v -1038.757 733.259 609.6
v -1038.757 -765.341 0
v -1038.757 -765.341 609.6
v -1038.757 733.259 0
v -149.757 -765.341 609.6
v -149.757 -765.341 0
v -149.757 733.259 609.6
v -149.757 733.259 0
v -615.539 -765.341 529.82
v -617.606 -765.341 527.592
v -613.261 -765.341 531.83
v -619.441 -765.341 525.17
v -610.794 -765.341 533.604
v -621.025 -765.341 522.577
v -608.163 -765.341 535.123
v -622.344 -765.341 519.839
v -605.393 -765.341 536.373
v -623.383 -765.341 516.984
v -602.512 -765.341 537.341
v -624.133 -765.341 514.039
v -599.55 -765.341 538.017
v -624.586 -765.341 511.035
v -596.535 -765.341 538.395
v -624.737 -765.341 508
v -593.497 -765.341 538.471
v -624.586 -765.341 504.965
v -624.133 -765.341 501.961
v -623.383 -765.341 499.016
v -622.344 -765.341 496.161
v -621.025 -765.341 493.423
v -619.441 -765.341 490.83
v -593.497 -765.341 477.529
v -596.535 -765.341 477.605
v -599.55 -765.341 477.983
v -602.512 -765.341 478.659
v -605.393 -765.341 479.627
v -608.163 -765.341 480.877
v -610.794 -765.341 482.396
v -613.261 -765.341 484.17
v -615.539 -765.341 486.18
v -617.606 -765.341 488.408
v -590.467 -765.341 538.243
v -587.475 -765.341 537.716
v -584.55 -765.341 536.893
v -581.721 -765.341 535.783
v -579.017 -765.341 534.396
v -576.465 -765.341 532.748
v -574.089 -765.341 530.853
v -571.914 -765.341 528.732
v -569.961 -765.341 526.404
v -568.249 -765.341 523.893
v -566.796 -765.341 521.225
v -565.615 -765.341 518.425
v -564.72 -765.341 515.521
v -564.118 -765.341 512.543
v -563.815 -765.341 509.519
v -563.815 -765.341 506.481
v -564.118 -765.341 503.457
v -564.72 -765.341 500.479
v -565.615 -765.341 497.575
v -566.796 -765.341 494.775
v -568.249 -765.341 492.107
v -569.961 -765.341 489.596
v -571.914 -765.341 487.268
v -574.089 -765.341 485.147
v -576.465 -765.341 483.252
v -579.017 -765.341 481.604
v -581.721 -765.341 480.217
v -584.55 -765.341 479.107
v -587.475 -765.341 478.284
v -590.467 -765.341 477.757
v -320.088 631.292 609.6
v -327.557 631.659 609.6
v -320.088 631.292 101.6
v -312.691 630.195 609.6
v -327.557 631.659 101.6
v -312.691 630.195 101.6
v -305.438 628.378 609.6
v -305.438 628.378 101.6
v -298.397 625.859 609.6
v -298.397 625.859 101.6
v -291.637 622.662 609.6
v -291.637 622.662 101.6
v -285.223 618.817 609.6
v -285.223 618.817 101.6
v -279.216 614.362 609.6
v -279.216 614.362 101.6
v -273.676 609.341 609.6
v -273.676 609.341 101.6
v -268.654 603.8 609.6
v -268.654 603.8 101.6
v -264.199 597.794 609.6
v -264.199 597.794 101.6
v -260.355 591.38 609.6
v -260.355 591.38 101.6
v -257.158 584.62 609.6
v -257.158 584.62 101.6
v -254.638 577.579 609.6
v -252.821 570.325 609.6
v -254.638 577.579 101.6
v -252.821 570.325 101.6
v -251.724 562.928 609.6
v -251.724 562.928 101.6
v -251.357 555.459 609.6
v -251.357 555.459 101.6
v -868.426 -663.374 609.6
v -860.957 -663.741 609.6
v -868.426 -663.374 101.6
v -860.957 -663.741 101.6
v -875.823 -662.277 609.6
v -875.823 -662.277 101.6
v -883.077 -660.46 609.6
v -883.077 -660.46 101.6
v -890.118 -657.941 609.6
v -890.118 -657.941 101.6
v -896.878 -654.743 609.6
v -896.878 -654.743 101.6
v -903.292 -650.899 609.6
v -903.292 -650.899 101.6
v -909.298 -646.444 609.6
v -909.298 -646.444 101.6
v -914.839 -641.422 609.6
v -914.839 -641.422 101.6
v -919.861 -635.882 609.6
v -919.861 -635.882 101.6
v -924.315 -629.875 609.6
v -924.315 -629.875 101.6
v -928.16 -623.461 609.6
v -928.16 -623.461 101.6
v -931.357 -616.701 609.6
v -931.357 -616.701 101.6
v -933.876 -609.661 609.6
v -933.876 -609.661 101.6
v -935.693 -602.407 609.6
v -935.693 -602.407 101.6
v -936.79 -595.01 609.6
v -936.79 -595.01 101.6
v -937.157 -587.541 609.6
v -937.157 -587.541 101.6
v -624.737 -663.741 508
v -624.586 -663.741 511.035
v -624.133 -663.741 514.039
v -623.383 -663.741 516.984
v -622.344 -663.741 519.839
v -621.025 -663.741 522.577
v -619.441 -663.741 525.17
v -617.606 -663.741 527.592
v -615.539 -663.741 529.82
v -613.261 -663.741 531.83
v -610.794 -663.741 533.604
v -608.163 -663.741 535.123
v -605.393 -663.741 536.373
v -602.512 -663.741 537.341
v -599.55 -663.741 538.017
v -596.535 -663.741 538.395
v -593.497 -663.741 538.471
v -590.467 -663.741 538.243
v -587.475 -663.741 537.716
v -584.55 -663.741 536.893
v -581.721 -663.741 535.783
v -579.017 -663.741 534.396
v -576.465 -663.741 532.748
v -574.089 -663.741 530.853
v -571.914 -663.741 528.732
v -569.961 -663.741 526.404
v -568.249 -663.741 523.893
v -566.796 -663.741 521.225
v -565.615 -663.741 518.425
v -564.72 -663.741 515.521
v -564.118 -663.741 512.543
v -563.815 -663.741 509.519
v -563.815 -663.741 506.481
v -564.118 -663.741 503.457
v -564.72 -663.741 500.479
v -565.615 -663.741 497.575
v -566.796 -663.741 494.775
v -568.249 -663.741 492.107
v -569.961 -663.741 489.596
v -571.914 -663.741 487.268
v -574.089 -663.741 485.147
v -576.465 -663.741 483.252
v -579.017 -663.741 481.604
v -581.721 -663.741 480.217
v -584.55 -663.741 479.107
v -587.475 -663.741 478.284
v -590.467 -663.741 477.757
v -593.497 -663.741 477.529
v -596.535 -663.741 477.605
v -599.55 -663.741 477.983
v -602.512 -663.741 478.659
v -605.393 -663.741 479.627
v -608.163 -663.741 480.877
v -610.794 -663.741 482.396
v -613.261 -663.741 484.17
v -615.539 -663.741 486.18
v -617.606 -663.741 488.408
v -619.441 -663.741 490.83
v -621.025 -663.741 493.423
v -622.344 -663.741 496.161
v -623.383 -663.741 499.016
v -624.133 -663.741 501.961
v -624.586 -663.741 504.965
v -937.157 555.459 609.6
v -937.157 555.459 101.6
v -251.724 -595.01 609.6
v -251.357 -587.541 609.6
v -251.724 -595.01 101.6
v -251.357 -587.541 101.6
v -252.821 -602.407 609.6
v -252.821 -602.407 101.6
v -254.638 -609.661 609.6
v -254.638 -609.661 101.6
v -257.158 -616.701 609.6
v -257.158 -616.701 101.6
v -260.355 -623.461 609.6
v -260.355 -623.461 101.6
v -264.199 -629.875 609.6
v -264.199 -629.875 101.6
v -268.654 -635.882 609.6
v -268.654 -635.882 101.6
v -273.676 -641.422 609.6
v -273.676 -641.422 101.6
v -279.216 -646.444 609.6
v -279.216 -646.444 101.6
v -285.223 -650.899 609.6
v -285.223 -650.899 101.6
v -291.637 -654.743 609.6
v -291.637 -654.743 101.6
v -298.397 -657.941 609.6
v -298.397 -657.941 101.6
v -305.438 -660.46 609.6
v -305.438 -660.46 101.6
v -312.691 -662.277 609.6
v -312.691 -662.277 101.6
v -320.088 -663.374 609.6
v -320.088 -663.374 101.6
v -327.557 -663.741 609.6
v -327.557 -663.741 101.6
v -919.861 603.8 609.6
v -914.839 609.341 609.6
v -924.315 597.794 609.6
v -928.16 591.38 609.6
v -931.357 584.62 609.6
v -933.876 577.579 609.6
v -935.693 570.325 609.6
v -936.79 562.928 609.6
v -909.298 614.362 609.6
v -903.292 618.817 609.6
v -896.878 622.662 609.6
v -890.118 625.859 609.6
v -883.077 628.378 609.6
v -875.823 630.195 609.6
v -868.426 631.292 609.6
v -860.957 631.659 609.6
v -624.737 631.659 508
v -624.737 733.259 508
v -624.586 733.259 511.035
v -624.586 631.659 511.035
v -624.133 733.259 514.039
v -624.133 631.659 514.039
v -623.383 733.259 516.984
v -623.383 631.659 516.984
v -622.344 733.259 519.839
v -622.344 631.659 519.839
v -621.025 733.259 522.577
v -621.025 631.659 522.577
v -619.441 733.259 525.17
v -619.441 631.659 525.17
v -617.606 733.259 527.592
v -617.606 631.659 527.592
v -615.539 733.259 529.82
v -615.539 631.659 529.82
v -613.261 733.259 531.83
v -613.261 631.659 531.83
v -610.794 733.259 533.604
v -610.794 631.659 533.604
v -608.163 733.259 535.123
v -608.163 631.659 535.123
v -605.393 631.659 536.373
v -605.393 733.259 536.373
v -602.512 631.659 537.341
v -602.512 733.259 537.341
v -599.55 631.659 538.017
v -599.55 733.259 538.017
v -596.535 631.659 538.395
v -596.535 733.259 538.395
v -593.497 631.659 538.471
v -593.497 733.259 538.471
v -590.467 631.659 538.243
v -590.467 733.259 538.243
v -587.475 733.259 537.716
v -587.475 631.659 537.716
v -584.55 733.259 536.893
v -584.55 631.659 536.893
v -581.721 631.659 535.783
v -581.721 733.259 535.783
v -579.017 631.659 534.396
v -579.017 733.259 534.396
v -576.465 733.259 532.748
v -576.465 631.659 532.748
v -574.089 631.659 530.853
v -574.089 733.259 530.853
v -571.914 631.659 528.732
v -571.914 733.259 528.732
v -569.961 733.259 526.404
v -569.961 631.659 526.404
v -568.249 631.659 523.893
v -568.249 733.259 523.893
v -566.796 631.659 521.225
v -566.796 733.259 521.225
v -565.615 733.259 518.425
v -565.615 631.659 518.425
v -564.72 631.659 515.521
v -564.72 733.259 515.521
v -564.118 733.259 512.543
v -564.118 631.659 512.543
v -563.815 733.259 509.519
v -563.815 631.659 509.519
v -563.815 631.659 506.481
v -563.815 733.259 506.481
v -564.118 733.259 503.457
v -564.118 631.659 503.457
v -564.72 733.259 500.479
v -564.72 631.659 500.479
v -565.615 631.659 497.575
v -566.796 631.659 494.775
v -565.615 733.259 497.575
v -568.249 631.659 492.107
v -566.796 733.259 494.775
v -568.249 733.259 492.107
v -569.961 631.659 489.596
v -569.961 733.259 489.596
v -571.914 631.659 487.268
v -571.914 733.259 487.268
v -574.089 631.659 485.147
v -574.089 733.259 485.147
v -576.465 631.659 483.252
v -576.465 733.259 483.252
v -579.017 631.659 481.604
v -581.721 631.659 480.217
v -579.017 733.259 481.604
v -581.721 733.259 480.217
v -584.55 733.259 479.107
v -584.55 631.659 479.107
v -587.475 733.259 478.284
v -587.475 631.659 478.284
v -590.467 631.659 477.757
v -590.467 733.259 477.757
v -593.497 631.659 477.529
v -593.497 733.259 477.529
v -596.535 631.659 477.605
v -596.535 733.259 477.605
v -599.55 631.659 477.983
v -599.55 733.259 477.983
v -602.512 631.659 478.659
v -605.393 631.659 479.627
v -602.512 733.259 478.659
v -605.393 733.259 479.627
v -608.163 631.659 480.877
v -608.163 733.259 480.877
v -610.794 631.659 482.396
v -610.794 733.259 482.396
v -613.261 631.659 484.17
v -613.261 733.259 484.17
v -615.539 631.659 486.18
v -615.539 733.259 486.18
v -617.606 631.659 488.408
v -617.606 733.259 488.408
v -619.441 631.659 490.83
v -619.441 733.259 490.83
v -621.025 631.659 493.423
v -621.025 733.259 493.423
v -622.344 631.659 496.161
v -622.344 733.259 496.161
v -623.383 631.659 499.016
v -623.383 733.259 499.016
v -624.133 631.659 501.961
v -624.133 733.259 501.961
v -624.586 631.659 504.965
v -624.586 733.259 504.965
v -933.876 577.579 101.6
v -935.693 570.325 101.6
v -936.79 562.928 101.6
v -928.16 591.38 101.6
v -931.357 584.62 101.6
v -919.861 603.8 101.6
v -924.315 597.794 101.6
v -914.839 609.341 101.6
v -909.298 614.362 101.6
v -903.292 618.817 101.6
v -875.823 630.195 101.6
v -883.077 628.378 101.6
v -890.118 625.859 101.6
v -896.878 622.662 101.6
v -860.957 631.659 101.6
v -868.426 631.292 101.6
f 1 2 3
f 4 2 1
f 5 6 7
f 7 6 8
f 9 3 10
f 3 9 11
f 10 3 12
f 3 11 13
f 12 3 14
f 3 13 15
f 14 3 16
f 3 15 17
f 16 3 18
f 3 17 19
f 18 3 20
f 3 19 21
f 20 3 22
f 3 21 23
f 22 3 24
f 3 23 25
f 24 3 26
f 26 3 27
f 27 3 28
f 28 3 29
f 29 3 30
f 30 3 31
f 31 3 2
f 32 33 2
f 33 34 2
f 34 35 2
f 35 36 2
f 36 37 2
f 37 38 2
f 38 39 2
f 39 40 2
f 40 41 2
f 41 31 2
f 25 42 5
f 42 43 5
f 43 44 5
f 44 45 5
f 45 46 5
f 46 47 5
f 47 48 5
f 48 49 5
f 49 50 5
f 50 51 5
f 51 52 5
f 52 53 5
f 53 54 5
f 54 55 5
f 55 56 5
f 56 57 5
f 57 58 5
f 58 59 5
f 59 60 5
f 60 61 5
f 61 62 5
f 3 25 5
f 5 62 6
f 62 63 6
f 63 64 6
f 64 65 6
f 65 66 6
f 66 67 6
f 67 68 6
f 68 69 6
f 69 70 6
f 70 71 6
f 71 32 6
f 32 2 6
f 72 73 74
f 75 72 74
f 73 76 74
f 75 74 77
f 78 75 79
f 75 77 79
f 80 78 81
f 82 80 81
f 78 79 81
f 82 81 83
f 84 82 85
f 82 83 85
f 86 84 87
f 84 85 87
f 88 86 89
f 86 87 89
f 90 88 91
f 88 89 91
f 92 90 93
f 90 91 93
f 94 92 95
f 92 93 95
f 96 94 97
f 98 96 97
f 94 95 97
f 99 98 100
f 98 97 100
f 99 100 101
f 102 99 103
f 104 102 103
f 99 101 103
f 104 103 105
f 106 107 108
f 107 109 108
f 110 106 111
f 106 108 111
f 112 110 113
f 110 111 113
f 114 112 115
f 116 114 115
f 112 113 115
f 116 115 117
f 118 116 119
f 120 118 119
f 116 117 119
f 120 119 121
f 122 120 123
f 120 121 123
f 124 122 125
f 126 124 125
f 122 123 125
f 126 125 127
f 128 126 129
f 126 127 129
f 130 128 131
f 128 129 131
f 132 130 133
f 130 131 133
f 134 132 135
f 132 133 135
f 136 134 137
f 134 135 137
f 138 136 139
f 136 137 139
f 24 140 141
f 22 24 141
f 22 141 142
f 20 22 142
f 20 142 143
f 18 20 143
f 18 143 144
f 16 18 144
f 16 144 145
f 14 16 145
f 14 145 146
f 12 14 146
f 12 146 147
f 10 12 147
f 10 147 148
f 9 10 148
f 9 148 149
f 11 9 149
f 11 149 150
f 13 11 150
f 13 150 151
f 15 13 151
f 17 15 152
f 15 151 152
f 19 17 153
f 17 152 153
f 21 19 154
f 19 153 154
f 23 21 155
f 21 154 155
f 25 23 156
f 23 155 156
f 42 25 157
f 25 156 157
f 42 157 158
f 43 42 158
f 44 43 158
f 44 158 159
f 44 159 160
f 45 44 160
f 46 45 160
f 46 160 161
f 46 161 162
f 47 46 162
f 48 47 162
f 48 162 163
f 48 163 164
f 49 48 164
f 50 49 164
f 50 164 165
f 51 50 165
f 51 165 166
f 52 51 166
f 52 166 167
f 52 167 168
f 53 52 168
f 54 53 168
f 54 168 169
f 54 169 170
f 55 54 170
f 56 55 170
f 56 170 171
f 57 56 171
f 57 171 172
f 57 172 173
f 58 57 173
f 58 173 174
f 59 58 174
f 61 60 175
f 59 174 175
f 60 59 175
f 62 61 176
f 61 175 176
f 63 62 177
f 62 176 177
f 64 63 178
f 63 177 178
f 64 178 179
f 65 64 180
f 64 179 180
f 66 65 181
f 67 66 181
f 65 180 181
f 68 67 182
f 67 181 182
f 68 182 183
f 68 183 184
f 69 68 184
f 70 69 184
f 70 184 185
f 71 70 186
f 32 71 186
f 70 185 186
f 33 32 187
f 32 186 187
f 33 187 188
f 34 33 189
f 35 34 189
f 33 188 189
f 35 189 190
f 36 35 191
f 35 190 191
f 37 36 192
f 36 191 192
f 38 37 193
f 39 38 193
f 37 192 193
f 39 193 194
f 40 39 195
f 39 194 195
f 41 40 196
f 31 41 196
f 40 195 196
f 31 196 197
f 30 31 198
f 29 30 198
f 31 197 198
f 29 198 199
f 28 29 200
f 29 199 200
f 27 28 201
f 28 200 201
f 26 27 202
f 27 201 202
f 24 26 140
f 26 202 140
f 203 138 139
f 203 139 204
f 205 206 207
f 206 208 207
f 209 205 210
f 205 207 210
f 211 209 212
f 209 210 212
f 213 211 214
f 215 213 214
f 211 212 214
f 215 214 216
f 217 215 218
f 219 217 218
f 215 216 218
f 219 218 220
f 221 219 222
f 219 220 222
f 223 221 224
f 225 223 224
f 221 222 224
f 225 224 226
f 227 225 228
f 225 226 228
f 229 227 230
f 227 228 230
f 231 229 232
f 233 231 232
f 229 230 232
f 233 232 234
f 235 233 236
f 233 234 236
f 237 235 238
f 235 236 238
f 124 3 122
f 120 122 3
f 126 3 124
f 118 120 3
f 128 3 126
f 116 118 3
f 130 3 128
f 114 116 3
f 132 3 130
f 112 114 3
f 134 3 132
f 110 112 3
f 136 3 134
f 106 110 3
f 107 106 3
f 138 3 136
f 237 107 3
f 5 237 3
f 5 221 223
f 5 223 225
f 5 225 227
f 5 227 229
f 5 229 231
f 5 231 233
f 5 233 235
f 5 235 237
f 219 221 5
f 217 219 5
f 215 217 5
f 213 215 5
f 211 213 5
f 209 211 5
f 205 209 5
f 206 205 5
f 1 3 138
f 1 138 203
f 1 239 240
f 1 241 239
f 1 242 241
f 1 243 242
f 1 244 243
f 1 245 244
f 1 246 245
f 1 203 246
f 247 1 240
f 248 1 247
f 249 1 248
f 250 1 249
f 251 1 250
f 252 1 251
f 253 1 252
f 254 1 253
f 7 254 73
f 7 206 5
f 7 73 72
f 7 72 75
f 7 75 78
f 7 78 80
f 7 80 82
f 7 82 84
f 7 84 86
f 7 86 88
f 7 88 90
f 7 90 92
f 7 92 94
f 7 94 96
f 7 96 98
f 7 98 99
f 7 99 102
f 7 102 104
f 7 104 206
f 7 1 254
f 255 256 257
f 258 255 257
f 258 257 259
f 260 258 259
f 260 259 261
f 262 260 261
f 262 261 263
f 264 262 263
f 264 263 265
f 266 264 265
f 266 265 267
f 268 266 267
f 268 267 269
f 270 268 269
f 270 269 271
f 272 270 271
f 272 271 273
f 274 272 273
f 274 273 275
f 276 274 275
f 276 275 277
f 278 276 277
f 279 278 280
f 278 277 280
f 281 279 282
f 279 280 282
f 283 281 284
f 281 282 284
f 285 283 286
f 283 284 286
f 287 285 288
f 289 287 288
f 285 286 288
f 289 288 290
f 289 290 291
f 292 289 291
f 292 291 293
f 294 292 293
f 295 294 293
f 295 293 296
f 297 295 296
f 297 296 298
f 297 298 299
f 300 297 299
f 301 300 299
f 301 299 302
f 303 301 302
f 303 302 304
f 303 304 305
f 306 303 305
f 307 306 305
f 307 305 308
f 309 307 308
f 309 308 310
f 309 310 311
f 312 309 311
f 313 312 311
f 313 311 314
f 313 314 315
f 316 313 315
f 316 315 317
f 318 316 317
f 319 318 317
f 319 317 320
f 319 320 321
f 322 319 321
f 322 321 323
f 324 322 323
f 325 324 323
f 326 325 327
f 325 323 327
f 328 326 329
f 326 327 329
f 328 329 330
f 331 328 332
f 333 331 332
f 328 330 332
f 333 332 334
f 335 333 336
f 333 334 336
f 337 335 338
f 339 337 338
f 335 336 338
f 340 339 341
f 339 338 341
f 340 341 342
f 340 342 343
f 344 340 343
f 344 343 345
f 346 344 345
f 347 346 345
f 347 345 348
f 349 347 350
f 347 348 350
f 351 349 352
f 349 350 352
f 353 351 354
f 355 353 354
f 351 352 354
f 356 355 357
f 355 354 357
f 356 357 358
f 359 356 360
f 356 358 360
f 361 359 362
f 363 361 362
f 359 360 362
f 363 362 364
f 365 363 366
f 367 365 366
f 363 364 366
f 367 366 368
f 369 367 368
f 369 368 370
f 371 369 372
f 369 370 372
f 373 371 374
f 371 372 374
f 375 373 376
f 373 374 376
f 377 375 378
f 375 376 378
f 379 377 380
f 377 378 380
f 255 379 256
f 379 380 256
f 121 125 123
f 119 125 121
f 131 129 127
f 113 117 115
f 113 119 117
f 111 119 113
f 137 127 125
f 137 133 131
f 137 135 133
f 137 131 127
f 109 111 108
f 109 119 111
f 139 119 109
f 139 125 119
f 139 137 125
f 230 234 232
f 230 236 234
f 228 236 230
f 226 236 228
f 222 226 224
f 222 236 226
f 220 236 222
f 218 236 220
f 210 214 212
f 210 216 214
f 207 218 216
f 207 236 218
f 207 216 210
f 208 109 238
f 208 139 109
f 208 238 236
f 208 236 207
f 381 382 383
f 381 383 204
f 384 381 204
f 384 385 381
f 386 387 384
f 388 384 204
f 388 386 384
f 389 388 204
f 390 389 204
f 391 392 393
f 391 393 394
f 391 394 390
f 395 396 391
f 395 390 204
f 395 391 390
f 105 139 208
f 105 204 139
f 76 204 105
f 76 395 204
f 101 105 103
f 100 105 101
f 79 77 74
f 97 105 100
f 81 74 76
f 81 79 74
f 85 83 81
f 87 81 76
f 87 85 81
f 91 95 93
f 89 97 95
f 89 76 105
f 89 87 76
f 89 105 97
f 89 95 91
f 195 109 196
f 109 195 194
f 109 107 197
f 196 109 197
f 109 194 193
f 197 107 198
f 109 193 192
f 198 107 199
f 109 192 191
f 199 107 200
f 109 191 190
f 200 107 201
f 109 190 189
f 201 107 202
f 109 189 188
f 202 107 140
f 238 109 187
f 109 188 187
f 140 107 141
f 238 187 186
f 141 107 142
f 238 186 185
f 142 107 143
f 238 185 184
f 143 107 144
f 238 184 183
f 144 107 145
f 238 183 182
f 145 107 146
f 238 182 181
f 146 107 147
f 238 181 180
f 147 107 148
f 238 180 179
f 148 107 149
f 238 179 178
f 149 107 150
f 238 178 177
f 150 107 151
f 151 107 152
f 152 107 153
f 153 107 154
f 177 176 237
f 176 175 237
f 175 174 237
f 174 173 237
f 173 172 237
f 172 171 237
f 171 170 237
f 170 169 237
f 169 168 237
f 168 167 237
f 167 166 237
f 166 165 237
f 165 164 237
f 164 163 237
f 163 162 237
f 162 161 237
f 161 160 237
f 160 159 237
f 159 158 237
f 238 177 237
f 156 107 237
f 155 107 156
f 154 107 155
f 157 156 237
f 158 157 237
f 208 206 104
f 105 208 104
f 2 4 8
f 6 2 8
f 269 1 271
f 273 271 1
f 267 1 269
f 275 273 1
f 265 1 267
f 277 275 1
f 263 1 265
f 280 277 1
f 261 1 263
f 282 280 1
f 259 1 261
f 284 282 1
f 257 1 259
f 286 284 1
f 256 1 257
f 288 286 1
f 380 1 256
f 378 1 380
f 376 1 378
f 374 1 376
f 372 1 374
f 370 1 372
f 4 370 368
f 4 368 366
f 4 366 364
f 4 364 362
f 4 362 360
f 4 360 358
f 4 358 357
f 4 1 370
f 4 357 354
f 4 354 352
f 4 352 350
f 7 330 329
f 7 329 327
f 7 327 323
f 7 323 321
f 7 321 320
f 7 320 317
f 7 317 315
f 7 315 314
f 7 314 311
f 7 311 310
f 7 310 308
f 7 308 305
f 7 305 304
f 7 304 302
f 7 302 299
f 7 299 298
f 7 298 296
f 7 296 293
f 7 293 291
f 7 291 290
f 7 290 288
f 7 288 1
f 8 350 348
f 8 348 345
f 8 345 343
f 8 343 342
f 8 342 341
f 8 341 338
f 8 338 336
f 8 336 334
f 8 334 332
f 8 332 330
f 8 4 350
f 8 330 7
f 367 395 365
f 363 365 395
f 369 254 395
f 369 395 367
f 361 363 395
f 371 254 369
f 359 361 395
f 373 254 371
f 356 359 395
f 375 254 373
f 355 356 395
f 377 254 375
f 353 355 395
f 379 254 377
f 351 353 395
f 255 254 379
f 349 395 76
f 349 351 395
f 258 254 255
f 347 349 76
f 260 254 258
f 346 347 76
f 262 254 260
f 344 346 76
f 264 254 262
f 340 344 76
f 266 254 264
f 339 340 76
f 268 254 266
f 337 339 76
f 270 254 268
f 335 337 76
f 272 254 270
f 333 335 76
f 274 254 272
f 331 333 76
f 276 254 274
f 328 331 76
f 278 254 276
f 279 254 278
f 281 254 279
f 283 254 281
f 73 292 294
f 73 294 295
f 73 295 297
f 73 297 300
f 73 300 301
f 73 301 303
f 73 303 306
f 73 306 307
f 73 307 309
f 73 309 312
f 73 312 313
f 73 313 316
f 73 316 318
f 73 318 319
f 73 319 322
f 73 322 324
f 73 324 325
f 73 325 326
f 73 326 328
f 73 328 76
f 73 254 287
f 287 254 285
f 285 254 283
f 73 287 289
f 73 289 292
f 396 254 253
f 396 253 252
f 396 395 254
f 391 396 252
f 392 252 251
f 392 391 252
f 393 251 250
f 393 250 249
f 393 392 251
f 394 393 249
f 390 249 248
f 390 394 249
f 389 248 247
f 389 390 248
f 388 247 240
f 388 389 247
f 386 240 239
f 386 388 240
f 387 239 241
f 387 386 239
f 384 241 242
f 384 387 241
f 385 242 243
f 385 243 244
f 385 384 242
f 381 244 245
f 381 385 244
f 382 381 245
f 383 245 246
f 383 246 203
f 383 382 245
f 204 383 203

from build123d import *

# Parameters (mm, degrees)
F0_W     = 889
F0_H     = 1498.6
F1_DEPTH = 609.6
F2_W     = 685.8
F2_H     = 1295.4
F3_DEPTH = 508
F4_R     = 76.2
F5_R     = 76.2
F6_R     = 76.2
F7_R     = 76.2
F9_D     = 60.96
F11_D    = 60.96


with BuildPart() as f1:
    # F0 (on Top) → F1 (new body)
    with BuildSketch(Plane.XY):
        with Locations((-594.257204, -16.040897)):
            Rectangle(F0_W, F0_H)
    extrude(amount=F1_DEPTH)

    # F2 (on face) → F3 (cut)
    with BuildSketch(Plane.XY.offset(609.6)):
        with Locations((-594.257204, -16.040897)):
            Rectangle(F2_W, F2_H)
    extrude(amount=-F3_DEPTH, mode=Mode.SUBTRACT)

    # F4
    f4_edges = [f1.edges().sort_by_distance(p)[0] for p in [
        (-937.157204, 631.659103, 355.6),
    ]]
    fillet(f4_edges, radius=F4_R)

    # F5
    f5_edges = [f1.edges().sort_by_distance(p)[0] for p in [
        (-251.357204, 631.659103, 355.6),
    ]]
    fillet(f5_edges, radius=F5_R)

    # F6
    f6_edges = [f1.edges().sort_by_distance(p)[0] for p in [
        (-251.357204, -663.740897, 355.6),
    ]]
    fillet(f6_edges, radius=F6_R)

    # F7
    f7_edges = [f1.edges().sort_by_distance(p)[0] for p in [
        (-937.157204, -663.740897, 355.6),
    ]]
    fillet(f7_edges, radius=F7_R)

    # F9 (through all)
    with Locations(Plane.XZ.offset(-631.659103)):
        with Locations((-594.257204, 508)):
            Hole(F9_D / 2)

    # F11 (through all)
    with Locations(Plane(origin=(0, -663.740897, 0), x_dir=(-1, 0, 0), z_dir=(0, 1, 0))):
        with Locations((594.257204, 508)):
            Hole(F11_D / 2)


solid = f1.part
